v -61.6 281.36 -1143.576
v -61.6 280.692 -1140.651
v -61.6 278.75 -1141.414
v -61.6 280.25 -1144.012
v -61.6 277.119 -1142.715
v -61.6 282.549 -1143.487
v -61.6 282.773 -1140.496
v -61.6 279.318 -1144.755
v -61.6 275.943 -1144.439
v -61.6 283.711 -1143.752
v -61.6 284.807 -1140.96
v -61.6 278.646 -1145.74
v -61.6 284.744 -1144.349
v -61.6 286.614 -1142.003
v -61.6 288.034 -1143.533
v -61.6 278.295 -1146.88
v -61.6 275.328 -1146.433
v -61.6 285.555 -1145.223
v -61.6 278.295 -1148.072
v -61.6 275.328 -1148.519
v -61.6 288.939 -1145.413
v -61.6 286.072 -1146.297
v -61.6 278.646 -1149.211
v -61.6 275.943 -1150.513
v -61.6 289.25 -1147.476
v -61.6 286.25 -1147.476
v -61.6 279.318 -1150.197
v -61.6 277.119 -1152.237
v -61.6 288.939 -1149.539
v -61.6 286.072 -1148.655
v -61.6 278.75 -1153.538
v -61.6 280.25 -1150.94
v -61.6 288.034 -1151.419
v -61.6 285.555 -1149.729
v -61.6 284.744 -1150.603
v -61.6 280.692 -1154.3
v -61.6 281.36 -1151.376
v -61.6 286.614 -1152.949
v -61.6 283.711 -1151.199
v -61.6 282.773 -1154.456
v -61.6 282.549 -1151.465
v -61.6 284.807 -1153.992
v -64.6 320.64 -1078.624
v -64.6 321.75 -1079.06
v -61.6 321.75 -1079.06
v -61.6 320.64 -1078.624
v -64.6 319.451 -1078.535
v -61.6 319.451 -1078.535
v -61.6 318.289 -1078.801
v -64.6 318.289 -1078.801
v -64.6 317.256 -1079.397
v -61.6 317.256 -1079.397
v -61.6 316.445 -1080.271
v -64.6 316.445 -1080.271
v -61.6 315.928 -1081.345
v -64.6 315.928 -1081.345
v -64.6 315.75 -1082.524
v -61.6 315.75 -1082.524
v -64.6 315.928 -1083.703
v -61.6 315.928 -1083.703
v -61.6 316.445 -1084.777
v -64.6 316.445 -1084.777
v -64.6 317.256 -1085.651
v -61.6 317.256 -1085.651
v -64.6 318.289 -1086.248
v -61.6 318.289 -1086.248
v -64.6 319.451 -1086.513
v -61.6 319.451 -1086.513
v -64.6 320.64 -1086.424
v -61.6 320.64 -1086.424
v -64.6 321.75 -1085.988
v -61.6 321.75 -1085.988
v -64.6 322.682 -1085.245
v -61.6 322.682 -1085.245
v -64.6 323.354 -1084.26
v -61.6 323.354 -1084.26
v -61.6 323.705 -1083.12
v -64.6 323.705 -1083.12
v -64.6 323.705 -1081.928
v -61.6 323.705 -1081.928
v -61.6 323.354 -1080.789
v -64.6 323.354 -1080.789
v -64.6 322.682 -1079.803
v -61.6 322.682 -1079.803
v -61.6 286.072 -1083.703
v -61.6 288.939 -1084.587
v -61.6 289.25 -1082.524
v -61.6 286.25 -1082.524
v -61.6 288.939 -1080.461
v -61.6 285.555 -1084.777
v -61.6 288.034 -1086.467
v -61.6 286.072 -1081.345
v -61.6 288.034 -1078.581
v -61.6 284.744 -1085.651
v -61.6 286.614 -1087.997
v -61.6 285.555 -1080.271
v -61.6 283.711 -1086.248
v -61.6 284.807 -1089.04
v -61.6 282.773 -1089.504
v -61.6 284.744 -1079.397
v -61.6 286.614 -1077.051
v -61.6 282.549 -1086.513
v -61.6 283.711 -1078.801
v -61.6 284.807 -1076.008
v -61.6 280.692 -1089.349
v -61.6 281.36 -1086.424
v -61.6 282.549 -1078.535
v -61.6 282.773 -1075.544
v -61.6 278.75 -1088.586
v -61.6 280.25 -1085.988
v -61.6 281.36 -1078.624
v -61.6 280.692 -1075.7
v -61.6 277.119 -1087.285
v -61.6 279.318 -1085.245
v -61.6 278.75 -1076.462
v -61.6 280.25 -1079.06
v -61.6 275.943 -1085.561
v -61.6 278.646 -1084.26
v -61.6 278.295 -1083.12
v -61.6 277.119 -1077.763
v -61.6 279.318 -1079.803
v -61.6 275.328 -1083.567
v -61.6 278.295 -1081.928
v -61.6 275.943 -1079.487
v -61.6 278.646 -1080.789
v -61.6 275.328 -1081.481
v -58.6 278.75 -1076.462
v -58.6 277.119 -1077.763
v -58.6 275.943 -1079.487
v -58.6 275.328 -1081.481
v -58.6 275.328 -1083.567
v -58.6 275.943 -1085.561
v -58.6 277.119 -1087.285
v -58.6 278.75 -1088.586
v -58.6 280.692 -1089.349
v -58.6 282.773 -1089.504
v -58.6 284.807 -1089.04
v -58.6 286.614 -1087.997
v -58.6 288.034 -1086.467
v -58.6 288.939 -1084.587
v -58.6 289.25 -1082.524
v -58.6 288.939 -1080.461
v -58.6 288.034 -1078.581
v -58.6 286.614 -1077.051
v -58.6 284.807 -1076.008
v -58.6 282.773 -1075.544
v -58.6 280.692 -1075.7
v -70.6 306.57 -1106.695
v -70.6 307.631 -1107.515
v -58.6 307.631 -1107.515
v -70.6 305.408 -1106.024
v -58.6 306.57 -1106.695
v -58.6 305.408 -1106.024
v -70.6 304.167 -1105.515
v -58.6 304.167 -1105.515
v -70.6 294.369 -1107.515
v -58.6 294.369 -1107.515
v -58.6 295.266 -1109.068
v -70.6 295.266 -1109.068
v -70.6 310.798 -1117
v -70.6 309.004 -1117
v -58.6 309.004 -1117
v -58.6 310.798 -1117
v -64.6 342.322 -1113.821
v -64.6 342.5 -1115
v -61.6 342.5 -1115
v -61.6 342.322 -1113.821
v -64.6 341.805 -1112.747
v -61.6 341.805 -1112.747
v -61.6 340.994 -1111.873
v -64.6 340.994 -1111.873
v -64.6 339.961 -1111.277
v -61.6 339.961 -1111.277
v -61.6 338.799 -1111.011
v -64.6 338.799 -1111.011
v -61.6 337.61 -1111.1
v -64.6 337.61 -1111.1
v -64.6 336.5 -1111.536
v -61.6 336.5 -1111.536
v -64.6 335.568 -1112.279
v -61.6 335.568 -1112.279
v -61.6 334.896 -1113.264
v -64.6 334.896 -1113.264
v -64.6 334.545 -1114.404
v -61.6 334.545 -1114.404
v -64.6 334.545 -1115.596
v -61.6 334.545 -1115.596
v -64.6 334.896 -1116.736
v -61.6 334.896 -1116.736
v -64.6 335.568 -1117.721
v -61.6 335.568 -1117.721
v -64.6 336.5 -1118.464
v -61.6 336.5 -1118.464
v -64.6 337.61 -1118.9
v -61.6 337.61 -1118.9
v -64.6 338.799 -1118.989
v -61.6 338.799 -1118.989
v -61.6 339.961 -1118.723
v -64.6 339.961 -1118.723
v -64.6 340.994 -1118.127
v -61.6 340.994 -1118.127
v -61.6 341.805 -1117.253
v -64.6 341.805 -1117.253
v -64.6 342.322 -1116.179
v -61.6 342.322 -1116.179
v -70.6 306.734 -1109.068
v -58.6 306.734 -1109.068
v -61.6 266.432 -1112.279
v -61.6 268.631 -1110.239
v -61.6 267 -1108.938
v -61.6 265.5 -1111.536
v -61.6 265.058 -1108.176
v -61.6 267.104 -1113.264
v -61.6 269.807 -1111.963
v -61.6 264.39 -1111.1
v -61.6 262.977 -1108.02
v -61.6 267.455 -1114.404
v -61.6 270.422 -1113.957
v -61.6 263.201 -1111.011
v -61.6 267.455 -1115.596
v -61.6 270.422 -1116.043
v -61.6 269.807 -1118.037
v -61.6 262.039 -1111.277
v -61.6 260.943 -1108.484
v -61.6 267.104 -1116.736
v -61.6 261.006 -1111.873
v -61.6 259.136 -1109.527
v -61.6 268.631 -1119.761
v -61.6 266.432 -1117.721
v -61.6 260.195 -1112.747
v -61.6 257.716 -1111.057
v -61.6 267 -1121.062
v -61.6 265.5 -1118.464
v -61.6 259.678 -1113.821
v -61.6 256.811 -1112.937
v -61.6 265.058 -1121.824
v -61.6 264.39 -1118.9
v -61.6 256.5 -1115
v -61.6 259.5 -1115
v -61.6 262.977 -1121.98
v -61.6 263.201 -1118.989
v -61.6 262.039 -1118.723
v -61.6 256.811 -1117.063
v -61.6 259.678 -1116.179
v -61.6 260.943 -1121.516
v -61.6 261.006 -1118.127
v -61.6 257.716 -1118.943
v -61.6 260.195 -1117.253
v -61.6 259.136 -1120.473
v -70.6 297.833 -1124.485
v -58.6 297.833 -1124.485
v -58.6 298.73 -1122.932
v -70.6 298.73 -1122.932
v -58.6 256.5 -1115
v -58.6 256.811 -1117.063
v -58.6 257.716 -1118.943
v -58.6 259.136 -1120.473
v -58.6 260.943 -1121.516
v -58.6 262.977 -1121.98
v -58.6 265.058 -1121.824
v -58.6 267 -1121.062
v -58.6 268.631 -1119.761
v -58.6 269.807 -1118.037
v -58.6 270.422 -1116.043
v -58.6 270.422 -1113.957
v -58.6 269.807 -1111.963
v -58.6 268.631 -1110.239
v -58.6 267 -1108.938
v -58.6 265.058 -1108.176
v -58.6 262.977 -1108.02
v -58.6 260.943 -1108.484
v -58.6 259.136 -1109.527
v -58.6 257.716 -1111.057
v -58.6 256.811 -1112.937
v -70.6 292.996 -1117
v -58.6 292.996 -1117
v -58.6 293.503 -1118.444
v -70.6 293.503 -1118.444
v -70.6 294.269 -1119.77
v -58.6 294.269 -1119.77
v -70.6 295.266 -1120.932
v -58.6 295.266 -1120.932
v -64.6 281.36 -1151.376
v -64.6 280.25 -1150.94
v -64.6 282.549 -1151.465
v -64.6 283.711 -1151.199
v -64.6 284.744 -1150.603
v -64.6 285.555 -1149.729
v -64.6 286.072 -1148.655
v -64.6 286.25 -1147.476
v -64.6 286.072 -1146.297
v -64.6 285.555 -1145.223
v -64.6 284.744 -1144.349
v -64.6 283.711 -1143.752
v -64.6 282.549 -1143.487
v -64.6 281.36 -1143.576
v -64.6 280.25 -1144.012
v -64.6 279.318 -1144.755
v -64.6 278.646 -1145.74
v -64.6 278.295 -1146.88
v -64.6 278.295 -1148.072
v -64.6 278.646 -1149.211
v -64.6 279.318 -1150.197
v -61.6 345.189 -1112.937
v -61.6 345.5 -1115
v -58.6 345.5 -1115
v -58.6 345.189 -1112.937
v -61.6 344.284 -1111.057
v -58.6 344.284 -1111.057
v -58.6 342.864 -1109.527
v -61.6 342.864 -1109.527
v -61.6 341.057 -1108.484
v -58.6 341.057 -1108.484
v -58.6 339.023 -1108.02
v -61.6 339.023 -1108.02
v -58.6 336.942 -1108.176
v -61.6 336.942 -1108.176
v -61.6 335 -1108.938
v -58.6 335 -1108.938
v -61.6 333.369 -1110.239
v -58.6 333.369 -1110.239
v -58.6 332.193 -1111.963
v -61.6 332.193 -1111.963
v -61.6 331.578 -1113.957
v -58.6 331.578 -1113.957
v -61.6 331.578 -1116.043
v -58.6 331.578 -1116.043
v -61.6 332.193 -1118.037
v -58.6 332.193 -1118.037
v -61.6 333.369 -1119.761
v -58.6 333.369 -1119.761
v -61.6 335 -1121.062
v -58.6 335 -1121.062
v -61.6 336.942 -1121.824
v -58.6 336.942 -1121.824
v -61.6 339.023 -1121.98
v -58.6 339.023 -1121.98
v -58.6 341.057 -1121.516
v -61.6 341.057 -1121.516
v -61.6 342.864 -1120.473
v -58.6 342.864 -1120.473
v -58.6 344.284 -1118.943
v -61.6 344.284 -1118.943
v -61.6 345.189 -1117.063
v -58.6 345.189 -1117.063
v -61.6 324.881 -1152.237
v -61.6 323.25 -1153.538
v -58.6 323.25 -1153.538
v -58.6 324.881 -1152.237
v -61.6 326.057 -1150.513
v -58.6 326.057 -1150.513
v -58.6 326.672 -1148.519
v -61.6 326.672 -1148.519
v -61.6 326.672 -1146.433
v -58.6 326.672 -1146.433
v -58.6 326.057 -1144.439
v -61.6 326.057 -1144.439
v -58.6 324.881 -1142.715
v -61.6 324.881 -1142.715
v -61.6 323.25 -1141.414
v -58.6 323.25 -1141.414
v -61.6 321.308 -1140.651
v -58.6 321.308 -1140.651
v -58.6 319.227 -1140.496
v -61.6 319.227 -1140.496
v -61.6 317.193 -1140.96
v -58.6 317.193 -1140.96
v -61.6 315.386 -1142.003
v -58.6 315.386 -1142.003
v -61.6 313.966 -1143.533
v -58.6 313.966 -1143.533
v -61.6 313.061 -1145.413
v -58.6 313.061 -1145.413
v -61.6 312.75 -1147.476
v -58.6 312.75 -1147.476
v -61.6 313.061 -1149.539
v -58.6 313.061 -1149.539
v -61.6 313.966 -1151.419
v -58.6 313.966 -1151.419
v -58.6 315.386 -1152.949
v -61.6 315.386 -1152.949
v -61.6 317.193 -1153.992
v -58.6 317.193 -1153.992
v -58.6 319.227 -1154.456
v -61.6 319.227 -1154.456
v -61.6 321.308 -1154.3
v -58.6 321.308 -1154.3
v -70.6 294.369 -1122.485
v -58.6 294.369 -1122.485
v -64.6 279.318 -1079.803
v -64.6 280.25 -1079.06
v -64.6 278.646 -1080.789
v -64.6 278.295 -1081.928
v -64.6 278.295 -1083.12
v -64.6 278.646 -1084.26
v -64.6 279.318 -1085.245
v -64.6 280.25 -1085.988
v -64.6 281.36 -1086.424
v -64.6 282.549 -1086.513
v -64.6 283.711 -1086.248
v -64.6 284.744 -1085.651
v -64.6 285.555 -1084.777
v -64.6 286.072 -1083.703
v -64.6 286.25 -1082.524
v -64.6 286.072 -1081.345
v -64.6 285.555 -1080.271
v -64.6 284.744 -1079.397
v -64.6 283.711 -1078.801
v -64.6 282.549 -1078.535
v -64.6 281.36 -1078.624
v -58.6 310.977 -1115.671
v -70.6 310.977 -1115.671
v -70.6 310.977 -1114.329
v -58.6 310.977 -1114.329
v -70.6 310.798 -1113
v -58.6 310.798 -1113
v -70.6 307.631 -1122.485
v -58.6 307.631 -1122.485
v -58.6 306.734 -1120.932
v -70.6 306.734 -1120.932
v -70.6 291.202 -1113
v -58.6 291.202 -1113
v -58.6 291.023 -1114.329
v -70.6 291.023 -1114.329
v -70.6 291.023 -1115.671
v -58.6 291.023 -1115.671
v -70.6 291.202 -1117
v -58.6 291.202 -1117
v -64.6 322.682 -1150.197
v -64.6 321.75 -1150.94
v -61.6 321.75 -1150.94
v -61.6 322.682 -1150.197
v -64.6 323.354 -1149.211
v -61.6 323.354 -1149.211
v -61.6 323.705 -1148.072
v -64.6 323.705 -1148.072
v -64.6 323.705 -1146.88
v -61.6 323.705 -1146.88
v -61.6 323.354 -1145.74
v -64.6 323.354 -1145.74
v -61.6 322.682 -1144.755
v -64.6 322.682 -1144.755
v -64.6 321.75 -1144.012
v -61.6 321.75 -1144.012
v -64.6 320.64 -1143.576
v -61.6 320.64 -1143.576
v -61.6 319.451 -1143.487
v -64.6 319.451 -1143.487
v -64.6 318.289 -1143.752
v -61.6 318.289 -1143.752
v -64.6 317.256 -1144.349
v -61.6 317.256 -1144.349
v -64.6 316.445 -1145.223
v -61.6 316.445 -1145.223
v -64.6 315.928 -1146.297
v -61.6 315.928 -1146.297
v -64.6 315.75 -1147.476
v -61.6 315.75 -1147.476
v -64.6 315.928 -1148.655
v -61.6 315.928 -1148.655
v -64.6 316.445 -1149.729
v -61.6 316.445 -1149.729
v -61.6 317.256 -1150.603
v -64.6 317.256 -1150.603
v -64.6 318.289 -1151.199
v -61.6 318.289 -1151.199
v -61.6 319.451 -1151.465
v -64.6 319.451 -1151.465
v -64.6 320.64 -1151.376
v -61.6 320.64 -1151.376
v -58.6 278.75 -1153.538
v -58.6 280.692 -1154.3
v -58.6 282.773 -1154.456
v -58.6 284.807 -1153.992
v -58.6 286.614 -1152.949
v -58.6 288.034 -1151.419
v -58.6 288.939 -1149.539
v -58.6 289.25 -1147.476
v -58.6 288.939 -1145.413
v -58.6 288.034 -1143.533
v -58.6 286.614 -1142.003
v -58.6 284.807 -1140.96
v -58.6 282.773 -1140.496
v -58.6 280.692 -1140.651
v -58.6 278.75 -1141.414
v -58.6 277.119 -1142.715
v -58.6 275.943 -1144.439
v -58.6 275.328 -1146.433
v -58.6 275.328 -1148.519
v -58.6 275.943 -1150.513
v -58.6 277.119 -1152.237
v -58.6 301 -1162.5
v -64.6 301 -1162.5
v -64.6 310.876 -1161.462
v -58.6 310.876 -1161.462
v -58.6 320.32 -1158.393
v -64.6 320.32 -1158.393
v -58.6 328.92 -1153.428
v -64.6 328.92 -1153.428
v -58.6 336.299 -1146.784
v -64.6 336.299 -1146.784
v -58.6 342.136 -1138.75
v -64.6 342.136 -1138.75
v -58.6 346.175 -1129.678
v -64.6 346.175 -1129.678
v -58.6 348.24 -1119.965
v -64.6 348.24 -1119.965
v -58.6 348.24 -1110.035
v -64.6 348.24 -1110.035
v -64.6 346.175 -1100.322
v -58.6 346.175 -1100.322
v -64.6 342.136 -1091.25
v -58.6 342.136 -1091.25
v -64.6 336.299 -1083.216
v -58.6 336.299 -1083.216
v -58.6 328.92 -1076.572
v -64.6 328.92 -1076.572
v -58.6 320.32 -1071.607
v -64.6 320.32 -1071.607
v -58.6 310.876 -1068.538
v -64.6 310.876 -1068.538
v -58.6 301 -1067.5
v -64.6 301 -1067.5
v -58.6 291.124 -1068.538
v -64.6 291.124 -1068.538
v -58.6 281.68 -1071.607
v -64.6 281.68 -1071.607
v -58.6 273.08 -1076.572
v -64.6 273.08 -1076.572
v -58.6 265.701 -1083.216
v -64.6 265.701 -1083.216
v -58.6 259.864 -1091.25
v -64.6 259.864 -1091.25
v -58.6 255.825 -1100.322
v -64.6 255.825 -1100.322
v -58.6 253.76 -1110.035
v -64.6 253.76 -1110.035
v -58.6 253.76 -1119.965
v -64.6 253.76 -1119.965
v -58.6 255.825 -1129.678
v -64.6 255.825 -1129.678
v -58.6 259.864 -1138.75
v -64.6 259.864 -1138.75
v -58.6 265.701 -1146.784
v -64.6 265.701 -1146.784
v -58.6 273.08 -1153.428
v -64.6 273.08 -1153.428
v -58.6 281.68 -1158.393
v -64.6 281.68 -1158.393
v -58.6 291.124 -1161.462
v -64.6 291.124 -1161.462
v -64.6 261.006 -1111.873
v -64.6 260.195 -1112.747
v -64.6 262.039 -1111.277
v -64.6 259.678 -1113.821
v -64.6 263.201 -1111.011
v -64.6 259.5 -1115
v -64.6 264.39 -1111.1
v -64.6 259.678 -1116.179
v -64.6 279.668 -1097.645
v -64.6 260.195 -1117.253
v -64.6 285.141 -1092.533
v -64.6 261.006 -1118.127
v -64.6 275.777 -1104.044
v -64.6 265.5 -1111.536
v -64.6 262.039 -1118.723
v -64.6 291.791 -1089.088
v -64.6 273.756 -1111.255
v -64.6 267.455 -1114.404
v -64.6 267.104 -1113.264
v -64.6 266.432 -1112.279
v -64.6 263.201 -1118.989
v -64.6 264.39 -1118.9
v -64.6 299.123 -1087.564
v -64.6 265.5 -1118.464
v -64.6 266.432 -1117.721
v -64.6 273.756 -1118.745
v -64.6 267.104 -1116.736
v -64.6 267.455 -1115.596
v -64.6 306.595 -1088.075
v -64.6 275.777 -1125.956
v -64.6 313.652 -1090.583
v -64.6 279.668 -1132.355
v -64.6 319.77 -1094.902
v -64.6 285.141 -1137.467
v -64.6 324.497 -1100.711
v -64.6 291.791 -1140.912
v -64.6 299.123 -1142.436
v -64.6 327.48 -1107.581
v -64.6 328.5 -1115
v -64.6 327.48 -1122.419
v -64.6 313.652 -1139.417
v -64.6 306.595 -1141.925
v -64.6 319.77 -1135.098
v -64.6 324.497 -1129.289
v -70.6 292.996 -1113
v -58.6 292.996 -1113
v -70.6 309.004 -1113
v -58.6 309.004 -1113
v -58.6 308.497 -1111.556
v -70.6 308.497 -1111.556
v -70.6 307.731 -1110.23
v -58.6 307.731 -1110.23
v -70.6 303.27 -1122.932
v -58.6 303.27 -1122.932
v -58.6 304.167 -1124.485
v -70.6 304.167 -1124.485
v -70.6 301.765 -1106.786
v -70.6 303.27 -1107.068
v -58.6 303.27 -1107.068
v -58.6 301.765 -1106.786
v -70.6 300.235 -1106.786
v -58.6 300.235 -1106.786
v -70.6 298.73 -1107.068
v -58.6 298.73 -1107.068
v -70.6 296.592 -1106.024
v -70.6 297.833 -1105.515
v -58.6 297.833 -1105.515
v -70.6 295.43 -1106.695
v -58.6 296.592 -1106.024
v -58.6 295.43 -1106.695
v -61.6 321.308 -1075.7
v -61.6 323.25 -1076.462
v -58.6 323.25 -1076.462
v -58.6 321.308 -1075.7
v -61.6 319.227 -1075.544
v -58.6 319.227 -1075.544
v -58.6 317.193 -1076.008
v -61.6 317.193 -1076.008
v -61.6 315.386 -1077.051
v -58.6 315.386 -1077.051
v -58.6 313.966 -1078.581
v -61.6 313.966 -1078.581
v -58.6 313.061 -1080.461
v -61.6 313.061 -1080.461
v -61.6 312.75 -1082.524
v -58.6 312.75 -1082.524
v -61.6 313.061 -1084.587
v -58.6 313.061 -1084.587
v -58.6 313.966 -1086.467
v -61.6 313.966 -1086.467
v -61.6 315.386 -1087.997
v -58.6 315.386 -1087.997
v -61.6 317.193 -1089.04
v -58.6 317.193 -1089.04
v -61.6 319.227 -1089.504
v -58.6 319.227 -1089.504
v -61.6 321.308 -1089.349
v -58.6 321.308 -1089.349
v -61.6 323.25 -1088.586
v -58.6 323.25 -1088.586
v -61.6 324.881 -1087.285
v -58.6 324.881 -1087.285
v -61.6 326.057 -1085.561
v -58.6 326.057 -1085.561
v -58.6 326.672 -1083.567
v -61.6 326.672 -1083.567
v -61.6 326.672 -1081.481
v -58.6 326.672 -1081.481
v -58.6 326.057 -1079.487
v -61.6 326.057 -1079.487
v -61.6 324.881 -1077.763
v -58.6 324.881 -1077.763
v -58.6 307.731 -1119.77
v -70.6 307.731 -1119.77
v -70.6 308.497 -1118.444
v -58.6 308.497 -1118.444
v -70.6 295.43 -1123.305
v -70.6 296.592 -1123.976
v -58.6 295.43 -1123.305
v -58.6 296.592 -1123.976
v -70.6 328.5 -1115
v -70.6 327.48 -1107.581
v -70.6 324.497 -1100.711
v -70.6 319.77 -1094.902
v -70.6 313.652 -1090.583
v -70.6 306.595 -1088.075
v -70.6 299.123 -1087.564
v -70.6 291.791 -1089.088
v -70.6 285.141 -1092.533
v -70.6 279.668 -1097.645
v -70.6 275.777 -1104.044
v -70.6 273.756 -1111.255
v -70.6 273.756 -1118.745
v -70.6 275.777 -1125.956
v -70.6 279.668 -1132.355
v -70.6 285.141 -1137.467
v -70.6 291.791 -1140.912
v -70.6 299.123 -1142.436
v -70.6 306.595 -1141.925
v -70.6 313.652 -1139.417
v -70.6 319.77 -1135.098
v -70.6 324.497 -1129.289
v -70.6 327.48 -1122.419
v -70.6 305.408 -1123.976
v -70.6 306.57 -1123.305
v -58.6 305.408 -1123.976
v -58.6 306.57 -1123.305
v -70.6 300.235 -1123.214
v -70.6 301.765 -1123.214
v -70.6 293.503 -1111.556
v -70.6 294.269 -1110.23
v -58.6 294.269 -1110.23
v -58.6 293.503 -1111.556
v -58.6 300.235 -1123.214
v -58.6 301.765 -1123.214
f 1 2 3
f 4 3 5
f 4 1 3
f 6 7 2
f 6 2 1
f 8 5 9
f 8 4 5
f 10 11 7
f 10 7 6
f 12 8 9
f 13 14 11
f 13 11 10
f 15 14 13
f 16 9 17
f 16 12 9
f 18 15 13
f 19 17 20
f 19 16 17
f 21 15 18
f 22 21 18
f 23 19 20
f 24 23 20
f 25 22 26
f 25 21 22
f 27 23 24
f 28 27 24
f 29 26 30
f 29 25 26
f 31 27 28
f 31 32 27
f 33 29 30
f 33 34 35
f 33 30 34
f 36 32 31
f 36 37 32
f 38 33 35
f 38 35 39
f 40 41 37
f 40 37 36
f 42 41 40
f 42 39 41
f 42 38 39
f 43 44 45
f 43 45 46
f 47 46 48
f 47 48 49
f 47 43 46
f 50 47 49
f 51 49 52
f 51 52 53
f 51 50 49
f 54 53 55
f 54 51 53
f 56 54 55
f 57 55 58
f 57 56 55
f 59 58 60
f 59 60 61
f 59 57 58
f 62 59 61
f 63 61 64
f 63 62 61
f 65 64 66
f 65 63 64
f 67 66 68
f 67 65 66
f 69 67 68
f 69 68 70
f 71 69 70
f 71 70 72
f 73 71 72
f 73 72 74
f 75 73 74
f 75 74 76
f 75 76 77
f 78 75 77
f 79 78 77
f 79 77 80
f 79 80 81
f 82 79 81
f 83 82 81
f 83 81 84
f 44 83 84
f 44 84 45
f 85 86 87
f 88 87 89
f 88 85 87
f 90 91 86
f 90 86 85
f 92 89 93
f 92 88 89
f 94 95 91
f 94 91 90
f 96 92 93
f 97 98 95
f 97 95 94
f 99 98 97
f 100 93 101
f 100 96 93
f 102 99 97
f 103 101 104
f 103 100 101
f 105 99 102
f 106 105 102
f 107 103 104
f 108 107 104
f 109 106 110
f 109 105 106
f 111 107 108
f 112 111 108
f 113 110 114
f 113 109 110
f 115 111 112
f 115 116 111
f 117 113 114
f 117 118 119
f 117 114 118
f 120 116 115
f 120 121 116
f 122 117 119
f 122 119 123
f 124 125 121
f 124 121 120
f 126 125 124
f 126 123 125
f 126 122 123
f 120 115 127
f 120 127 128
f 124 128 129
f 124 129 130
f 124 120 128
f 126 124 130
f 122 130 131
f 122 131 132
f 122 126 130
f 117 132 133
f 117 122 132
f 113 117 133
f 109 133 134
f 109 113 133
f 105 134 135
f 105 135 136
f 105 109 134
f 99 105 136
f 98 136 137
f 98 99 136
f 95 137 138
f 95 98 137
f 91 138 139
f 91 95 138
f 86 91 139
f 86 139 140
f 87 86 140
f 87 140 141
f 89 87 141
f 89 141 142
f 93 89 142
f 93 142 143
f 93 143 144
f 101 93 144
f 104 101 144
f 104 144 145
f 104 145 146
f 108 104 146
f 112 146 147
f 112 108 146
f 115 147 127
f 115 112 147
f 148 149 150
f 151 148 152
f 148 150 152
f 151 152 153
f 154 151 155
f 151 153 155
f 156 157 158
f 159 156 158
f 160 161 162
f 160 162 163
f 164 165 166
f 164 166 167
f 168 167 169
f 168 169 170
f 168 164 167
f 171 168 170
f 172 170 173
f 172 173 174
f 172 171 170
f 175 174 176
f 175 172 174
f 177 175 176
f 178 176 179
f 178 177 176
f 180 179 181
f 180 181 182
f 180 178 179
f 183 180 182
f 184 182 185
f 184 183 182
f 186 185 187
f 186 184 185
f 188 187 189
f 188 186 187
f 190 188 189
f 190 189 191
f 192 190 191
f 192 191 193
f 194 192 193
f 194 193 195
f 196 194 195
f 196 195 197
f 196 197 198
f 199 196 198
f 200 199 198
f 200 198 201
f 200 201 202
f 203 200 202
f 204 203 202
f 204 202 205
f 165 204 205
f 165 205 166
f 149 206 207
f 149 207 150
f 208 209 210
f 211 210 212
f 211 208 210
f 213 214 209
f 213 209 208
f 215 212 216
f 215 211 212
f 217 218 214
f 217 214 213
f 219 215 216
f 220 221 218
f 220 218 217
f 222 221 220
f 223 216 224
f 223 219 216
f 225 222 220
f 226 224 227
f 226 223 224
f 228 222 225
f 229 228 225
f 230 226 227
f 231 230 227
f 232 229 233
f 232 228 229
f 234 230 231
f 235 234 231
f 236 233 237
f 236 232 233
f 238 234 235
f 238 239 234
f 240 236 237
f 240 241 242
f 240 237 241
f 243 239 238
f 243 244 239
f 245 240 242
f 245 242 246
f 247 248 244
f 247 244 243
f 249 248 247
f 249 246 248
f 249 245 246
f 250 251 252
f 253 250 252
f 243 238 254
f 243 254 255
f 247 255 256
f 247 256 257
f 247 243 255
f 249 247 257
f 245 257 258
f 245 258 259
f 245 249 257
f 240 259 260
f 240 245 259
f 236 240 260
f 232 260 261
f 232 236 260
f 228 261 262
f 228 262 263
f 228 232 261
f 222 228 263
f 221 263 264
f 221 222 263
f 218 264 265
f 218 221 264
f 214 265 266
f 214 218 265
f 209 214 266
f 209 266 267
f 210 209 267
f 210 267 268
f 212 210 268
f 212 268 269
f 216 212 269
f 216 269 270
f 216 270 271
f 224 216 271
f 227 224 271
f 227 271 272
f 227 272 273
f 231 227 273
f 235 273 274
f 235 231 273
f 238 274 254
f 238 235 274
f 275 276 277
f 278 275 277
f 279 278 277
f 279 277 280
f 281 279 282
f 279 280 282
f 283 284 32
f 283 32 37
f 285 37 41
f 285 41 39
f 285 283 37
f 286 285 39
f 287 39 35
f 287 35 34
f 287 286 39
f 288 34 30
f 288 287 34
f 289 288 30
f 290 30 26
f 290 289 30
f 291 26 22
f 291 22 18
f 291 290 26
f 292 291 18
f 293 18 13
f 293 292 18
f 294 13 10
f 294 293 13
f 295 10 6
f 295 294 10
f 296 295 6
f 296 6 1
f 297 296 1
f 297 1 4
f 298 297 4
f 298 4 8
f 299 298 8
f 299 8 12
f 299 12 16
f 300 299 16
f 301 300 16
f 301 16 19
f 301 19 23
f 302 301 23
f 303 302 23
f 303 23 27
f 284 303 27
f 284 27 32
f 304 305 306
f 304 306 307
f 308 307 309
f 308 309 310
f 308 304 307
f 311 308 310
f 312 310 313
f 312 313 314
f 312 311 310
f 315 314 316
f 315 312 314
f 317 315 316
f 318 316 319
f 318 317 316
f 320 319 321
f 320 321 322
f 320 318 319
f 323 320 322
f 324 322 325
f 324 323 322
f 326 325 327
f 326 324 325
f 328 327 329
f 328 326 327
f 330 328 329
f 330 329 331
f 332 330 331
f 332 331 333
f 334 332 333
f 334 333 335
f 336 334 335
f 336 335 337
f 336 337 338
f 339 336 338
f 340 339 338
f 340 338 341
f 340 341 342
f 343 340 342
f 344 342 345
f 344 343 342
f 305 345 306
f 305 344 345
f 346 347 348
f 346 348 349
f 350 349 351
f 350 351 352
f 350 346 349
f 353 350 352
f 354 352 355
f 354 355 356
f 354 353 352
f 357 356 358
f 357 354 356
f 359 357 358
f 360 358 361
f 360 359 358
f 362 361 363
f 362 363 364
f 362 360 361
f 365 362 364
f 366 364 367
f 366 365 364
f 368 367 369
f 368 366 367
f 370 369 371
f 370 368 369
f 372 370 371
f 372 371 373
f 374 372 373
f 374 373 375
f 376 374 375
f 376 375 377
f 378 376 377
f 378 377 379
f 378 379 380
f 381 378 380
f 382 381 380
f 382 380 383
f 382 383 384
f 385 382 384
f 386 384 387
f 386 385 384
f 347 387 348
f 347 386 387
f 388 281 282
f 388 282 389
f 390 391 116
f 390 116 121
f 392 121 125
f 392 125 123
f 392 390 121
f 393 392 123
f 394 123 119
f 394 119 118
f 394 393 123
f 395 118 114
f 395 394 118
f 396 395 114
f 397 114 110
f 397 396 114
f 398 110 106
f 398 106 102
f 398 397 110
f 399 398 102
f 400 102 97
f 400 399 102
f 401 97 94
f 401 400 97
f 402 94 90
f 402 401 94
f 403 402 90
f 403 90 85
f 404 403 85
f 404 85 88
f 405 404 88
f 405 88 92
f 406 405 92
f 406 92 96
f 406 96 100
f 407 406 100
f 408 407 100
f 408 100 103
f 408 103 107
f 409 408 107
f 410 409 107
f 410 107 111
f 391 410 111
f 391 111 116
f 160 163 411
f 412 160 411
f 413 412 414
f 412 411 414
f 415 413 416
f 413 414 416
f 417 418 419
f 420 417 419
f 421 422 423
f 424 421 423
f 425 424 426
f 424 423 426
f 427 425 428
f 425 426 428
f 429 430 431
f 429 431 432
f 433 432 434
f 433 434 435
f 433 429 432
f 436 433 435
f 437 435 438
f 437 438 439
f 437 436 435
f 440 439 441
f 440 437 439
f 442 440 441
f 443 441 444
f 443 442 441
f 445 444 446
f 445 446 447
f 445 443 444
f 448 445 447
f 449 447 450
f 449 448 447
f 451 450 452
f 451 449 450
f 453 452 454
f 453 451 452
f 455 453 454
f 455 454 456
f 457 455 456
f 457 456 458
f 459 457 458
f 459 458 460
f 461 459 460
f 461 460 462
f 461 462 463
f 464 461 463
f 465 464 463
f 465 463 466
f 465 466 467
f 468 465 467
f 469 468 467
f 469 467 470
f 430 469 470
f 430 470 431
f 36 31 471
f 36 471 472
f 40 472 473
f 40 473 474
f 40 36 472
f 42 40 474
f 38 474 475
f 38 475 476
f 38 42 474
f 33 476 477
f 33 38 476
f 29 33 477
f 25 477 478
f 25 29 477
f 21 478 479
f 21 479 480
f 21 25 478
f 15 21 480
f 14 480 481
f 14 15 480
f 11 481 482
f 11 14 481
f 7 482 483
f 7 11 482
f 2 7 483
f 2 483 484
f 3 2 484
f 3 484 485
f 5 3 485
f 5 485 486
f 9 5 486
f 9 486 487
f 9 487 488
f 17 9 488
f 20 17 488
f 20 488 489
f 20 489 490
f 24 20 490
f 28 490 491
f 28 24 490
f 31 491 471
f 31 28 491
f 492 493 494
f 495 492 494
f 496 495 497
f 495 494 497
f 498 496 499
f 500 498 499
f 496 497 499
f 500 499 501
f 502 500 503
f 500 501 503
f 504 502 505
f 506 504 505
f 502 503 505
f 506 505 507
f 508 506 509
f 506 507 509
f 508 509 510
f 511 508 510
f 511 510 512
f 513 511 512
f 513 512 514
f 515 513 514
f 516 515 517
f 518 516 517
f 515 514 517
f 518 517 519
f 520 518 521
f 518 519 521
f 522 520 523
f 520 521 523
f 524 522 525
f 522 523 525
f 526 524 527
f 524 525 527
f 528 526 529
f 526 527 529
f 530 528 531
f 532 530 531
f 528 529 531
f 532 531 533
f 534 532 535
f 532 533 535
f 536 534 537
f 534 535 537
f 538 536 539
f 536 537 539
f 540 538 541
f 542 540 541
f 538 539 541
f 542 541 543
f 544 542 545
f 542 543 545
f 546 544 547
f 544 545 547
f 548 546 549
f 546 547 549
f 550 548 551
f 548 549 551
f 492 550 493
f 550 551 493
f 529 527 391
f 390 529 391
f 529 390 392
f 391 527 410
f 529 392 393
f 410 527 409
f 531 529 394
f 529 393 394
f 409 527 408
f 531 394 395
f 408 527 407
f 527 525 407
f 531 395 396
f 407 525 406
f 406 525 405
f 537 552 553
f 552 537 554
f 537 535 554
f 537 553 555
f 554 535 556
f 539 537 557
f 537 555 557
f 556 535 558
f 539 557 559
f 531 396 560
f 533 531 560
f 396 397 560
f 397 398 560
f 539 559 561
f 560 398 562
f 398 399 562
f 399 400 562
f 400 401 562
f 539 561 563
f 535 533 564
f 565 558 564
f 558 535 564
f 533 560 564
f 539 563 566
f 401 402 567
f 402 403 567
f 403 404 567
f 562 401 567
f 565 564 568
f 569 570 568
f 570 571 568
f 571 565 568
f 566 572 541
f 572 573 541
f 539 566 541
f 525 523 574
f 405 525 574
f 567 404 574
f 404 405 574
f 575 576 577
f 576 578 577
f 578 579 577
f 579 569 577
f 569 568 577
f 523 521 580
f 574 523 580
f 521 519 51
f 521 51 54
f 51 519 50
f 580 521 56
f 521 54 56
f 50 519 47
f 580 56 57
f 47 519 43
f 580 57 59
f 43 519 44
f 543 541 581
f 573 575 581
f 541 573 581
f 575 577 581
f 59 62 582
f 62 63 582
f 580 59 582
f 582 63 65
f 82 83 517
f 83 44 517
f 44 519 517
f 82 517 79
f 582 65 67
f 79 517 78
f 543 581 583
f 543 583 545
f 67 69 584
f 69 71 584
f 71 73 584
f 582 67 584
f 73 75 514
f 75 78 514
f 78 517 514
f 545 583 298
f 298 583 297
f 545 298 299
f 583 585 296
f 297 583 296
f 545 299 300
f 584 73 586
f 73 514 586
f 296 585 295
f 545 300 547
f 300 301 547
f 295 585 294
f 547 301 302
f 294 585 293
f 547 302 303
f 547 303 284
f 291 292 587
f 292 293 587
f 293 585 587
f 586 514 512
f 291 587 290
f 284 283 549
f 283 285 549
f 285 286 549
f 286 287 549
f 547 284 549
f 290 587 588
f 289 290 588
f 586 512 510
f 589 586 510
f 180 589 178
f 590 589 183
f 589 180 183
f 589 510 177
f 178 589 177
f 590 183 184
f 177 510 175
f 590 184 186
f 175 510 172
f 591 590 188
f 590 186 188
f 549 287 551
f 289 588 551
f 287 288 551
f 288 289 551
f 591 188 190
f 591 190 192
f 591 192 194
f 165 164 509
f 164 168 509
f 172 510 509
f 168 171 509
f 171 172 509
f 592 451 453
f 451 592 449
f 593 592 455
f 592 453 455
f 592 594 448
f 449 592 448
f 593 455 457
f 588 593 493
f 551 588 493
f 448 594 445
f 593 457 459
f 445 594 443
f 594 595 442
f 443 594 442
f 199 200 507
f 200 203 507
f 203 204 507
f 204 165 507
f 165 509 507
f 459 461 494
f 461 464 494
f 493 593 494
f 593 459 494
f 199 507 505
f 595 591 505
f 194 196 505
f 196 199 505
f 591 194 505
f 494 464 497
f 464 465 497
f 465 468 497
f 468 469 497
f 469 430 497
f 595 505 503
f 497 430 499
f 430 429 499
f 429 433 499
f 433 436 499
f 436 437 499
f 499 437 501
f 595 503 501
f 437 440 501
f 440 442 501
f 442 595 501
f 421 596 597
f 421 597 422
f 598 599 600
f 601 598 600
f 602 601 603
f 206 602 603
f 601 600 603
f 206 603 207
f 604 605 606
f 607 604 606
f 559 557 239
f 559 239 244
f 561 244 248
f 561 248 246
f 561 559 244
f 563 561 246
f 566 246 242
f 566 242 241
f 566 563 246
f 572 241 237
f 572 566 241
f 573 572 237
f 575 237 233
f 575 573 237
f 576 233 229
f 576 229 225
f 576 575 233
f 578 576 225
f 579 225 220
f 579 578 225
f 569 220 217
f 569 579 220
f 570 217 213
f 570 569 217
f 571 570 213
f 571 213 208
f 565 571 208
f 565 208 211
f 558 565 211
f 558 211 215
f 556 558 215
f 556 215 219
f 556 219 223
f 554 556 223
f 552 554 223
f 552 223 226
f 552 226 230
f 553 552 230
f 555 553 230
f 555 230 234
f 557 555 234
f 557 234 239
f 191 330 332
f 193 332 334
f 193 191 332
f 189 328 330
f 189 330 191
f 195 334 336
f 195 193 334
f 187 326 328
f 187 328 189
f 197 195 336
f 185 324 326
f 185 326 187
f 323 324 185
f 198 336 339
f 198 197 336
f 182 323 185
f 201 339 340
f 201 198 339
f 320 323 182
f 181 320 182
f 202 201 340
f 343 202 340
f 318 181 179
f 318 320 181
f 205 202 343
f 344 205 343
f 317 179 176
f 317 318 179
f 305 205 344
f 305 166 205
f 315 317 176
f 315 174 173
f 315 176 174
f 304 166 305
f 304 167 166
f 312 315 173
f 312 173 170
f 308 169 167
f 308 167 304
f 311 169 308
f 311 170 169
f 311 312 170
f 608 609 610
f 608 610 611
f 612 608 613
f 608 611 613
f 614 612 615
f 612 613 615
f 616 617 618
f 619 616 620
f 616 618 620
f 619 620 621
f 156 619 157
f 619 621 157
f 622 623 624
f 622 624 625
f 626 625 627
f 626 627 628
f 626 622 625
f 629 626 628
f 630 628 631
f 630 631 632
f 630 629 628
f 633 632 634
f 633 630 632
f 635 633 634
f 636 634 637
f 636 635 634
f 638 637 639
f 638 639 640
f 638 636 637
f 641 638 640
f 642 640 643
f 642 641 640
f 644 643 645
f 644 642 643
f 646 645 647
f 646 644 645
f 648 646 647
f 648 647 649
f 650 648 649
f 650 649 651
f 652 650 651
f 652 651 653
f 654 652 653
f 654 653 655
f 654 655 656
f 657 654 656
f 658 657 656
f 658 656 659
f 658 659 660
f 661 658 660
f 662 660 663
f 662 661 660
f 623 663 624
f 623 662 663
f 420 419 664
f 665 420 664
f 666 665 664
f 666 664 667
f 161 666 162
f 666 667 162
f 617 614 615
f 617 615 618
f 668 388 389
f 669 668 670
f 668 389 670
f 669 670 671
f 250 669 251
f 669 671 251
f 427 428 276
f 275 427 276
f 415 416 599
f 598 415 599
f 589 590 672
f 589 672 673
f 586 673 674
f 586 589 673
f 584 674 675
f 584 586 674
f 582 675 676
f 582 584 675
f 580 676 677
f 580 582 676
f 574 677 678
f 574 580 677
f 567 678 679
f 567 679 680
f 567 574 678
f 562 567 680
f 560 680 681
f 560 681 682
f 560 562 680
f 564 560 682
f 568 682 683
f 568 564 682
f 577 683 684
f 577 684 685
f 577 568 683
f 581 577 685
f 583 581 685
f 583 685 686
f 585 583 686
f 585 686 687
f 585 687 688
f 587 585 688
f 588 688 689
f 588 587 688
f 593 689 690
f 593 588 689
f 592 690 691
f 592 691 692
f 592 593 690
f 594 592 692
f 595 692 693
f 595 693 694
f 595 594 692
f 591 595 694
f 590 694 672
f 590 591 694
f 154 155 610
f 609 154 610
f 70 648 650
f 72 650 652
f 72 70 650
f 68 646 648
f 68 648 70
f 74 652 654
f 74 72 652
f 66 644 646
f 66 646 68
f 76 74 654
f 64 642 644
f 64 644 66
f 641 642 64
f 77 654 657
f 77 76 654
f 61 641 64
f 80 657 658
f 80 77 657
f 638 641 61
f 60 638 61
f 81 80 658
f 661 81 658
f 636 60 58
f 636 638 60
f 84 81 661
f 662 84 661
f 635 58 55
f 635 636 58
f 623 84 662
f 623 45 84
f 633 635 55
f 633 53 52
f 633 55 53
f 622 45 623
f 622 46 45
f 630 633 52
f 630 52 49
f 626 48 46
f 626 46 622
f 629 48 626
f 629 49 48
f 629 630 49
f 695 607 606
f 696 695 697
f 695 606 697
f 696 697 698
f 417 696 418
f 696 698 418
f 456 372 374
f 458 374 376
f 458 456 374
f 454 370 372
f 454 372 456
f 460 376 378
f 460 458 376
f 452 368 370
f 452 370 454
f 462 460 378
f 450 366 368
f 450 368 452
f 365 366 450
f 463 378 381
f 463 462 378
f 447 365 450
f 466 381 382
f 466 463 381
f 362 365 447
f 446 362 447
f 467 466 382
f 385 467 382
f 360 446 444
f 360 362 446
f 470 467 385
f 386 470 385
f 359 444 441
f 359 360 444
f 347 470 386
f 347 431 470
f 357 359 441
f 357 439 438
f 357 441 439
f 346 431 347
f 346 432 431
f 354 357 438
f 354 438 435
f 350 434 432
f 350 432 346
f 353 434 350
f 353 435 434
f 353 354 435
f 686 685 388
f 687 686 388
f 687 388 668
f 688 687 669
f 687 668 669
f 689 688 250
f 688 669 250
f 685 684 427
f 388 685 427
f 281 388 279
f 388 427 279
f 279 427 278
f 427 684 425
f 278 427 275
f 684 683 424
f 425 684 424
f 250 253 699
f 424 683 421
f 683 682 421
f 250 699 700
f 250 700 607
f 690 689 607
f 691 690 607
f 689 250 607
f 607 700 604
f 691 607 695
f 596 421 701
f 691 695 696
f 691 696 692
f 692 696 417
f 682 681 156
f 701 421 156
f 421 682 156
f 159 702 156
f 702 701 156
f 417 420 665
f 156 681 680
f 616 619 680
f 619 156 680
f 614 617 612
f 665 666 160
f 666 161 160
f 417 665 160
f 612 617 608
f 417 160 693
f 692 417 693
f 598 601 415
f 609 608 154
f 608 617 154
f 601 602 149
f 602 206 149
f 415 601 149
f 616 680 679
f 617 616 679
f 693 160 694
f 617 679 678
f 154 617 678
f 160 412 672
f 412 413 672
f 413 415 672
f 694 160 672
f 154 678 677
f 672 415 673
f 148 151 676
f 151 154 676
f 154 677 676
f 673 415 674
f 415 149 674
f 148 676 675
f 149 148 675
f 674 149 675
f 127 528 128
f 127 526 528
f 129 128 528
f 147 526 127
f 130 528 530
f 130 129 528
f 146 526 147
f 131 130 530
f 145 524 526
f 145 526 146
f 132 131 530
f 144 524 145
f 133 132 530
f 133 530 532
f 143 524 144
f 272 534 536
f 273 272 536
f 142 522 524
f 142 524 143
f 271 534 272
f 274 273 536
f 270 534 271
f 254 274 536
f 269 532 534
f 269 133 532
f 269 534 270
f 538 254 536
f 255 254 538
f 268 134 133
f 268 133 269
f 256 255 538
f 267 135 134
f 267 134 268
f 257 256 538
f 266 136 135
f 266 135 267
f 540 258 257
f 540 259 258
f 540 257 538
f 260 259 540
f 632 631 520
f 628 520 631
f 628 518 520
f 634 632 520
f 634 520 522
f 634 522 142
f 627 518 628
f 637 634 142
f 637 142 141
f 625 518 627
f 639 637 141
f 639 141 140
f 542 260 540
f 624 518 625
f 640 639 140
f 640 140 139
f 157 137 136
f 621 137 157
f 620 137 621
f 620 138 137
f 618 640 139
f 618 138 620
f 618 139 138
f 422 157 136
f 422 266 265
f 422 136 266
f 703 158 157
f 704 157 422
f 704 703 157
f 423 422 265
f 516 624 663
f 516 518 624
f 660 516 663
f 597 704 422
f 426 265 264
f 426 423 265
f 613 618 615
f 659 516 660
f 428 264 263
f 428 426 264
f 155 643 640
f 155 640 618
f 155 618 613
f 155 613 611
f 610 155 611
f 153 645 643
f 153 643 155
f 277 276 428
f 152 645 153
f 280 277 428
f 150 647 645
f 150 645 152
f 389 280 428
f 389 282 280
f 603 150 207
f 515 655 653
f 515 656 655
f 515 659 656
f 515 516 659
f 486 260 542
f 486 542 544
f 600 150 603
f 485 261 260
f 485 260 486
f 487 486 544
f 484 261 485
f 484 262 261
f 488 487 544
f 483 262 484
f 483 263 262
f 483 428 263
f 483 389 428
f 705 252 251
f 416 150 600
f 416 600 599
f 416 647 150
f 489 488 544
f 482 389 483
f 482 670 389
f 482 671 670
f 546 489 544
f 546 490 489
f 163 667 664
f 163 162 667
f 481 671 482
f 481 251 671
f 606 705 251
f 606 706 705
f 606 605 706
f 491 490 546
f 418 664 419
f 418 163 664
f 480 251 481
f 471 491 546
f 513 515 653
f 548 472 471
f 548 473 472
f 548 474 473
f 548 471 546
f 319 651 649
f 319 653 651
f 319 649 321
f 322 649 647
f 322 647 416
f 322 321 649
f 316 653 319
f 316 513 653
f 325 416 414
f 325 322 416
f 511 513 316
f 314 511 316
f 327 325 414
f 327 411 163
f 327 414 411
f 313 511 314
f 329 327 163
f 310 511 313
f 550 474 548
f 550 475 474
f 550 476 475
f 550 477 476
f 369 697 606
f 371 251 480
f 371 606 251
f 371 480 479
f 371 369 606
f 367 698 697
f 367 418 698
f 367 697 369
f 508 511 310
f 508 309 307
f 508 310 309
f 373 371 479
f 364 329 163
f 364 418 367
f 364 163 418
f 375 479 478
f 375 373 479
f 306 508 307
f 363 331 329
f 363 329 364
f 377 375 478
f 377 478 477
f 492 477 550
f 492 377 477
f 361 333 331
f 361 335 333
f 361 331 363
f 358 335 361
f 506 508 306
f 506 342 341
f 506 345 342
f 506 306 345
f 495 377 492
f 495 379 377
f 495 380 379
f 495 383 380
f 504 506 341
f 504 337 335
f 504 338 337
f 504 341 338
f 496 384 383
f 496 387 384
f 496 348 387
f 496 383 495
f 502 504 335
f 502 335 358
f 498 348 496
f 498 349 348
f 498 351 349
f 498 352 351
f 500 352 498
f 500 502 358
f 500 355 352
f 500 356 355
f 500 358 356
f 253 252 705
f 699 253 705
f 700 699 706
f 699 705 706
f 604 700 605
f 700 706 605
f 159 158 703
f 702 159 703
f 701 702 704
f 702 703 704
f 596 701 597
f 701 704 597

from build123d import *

# Parameters (mm, degrees)
BOSS_EXTRUDE1_OUTLINE_R = 47.5
BOSS_EXTRUDE1_DEPTH     = 6
SKETCH3_R               = 27.5
BOSS_EXTRUDE2_DEPTH     = 6
SKETCH1_3_R             = 4
CUT_EXTRUDE1_DEPTH      = 6
CUT_EXTRUDE2_START      = 3
SKETCH1_4_R             = 7
SKETCH1_4_R_2           = 4
CUT_EXTRUDE2_DEPTH      = 3
CIRPATTERN1_COUNT       = 6
CUT_EXTRUDE3_START      = -58.6
SKETCH4_R               = 8.25
CUT_EXTRUDE3_DEPTH      = 1158.065603692
CUT_EXTRUDE5_DEPTH      = 1216.665603692


# Read off the part's stored shape, not the designer's step: Boss-Extrude1
with BuildPart() as part:
    # Boss-Extrude1 outline → Boss-Extrude1 (new body)
    with BuildSketch(Plane(origin=(-64.6, 0, 0), x_dir=(0, 0, -1), z_dir=(1, 0, 0))):
        with Locations((1115, 301)):
            Circle(BOSS_EXTRUDE1_OUTLINE_R)
    extrude(amount=BOSS_EXTRUDE1_DEPTH)

    # Sketch3 → Boss-Extrude2 (add)
    with BuildSketch(Plane(origin=(-64.6, 0, 0), x_dir=(0, 0, -1), z_dir=(1, 0, 0))):
        with Locations(Location((1115, 301, 0), (0, 0, 90))):
            Circle(SKETCH3_R)
    extrude(amount=-BOSS_EXTRUDE2_DEPTH)

    # Sketch1<3> → Cut-Extrude1 (cut)
    with BuildSketch(Plane(origin=(-64.6, 0, 0), x_dir=(0, 0, -1), z_dir=(1, 0, 0))):
        with Locations(Location((1115, 338.5, 0), (0, 0, 90))):
            Circle(SKETCH1_3_R)
    cut_extrude1 = extrude(amount=CUT_EXTRUDE1_DEPTH, mode=Mode.SUBTRACT)

    # Sketch1<4> → Cut-Extrude2 (cut)
    with BuildSketch(Plane(origin=(-64.6, 0, 0), x_dir=(0, 0, -1), z_dir=(1, 0, 0)).offset(CUT_EXTRUDE2_START)):
        with Locations(Location((1115, 338.5, 0), (0, 0, 90))):
            Circle(SKETCH1_4_R)
        with Locations(Location((1115, 338.5, 0), (0, 0, 90))):
            Circle(SKETCH1_4_R_2, mode=Mode.SUBTRACT)
    cut_extrude2 = extrude(amount=CUT_EXTRUDE2_DEPTH, mode=Mode.SUBTRACT)

    # CirPattern1: Cut-Extrude1, Cut-Extrude2 ×6 about axis
    cirpattern1_axis = Axis((0, 301, -1115), (1, 0, 0))
    add([cut_extrude1.rotate(cirpattern1_axis, i * 360 / CIRPATTERN1_COUNT) for i in range(1, CIRPATTERN1_COUNT)], mode=Mode.SUBTRACT)
    add([cut_extrude2.rotate(cirpattern1_axis, i * 360 / CIRPATTERN1_COUNT) for i in range(1, CIRPATTERN1_COUNT)], mode=Mode.SUBTRACT)

    # Sketch4 → Cut-Extrude3 (cut, through all)
    with BuildSketch(Plane(origin=(0, 0, 0), x_dir=(0, 0, -1), z_dir=(1, 0, 0)).offset(CUT_EXTRUDE3_START)):
        with Locations(Location((1115, 301, 0), (0, 0, 90))):
            Circle(SKETCH4_R)
    extrude(amount=-CUT_EXTRUDE3_DEPTH, mode=Mode.SUBTRACT)

    # Sketch5 → Cut-Extrude5 (cut, through all)
    with BuildSketch(Plane(origin=(0, 0, 0), x_dir=(0, 0, -1), z_dir=(1, 0, 0))):
        with BuildLine():
            Line((1117, 308.745966692), (1117, 310.797958971))
            ThreePointArc((1117, 310.797958971), (1115, 311), (1113, 310.797958971))
            Line((1113, 310.797958971), (1113, 308.745966692))
            ThreePointArc((1113, 308.745966692), (1115, 309), (1117, 308.745966692))
        make_face()
        with BuildLine():
            Line((1122.485281374, 307.631030293), (1120.708203932, 306.605034154))
            ThreePointArc((1120.708203932, 306.605034154), (1121.92820323, 305), (1122.708203932, 303.140932539))
            Line((1122.708203932, 303.140932539), (1124.485281374, 304.166928678))
            ThreePointArc((1124.485281374, 304.166928678), (1123.660254038, 306), (1122.485281374, 307.631030293))
        make_face()
        with BuildLine():
            ThreePointArc((1107.291796067, 303.140932539), (1108.07179677, 305), (1109.291796067, 306.605034154))
            Line((1109.291796067, 306.605034154), (1107.514718626, 307.631030293))
            ThreePointArc((1107.514718626, 307.631030293), (1106.339745962, 306), (1105.514718626, 304.166928678))
            Line((1105.514718626, 304.166928678), (1107.291796067, 303.140932539))
        make_face()
        with BuildLine():
            Line((1124.485281374, 297.833071322), (1122.708203932, 298.859067461))
            ThreePointArc((1122.708203932, 298.859067461), (1121.92820323, 297), (1120.708203932, 295.394965846))
            Line((1120.708203932, 295.394965846), (1122.485281374, 294.368969707))
            ThreePointArc((1122.485281374, 294.368969707), (1123.660254038, 296), (1124.485281374, 297.833071322))
        make_face()
        with BuildLine():
            ThreePointArc((1109.291796067, 295.394965846), (1108.07179677, 297), (1107.291796067, 298.859067461))
            Line((1107.291796067, 298.859067461), (1105.514718626, 297.833071322))
            ThreePointArc((1105.514718626, 297.833071322), (1106.339745962, 296), (1107.514718626, 294.368969707))
            Line((1107.514718626, 294.368969707), (1109.291796067, 295.394965846))
        make_face()
        with BuildLine():
            Line((1117, 291.202041029), (1117, 293.254033308))
            ThreePointArc((1117, 293.254033308), (1115, 293), (1113, 293.254033308))
            Line((1113, 293.254033308), (1113, 291.202041029))
            ThreePointArc((1113, 291.202041029), (1115, 291), (1117, 291.202041029))
        make_face()
    extrude(amount=-CUT_EXTRUDE5_DEPTH, mode=Mode.SUBTRACT)


solid = part.part
